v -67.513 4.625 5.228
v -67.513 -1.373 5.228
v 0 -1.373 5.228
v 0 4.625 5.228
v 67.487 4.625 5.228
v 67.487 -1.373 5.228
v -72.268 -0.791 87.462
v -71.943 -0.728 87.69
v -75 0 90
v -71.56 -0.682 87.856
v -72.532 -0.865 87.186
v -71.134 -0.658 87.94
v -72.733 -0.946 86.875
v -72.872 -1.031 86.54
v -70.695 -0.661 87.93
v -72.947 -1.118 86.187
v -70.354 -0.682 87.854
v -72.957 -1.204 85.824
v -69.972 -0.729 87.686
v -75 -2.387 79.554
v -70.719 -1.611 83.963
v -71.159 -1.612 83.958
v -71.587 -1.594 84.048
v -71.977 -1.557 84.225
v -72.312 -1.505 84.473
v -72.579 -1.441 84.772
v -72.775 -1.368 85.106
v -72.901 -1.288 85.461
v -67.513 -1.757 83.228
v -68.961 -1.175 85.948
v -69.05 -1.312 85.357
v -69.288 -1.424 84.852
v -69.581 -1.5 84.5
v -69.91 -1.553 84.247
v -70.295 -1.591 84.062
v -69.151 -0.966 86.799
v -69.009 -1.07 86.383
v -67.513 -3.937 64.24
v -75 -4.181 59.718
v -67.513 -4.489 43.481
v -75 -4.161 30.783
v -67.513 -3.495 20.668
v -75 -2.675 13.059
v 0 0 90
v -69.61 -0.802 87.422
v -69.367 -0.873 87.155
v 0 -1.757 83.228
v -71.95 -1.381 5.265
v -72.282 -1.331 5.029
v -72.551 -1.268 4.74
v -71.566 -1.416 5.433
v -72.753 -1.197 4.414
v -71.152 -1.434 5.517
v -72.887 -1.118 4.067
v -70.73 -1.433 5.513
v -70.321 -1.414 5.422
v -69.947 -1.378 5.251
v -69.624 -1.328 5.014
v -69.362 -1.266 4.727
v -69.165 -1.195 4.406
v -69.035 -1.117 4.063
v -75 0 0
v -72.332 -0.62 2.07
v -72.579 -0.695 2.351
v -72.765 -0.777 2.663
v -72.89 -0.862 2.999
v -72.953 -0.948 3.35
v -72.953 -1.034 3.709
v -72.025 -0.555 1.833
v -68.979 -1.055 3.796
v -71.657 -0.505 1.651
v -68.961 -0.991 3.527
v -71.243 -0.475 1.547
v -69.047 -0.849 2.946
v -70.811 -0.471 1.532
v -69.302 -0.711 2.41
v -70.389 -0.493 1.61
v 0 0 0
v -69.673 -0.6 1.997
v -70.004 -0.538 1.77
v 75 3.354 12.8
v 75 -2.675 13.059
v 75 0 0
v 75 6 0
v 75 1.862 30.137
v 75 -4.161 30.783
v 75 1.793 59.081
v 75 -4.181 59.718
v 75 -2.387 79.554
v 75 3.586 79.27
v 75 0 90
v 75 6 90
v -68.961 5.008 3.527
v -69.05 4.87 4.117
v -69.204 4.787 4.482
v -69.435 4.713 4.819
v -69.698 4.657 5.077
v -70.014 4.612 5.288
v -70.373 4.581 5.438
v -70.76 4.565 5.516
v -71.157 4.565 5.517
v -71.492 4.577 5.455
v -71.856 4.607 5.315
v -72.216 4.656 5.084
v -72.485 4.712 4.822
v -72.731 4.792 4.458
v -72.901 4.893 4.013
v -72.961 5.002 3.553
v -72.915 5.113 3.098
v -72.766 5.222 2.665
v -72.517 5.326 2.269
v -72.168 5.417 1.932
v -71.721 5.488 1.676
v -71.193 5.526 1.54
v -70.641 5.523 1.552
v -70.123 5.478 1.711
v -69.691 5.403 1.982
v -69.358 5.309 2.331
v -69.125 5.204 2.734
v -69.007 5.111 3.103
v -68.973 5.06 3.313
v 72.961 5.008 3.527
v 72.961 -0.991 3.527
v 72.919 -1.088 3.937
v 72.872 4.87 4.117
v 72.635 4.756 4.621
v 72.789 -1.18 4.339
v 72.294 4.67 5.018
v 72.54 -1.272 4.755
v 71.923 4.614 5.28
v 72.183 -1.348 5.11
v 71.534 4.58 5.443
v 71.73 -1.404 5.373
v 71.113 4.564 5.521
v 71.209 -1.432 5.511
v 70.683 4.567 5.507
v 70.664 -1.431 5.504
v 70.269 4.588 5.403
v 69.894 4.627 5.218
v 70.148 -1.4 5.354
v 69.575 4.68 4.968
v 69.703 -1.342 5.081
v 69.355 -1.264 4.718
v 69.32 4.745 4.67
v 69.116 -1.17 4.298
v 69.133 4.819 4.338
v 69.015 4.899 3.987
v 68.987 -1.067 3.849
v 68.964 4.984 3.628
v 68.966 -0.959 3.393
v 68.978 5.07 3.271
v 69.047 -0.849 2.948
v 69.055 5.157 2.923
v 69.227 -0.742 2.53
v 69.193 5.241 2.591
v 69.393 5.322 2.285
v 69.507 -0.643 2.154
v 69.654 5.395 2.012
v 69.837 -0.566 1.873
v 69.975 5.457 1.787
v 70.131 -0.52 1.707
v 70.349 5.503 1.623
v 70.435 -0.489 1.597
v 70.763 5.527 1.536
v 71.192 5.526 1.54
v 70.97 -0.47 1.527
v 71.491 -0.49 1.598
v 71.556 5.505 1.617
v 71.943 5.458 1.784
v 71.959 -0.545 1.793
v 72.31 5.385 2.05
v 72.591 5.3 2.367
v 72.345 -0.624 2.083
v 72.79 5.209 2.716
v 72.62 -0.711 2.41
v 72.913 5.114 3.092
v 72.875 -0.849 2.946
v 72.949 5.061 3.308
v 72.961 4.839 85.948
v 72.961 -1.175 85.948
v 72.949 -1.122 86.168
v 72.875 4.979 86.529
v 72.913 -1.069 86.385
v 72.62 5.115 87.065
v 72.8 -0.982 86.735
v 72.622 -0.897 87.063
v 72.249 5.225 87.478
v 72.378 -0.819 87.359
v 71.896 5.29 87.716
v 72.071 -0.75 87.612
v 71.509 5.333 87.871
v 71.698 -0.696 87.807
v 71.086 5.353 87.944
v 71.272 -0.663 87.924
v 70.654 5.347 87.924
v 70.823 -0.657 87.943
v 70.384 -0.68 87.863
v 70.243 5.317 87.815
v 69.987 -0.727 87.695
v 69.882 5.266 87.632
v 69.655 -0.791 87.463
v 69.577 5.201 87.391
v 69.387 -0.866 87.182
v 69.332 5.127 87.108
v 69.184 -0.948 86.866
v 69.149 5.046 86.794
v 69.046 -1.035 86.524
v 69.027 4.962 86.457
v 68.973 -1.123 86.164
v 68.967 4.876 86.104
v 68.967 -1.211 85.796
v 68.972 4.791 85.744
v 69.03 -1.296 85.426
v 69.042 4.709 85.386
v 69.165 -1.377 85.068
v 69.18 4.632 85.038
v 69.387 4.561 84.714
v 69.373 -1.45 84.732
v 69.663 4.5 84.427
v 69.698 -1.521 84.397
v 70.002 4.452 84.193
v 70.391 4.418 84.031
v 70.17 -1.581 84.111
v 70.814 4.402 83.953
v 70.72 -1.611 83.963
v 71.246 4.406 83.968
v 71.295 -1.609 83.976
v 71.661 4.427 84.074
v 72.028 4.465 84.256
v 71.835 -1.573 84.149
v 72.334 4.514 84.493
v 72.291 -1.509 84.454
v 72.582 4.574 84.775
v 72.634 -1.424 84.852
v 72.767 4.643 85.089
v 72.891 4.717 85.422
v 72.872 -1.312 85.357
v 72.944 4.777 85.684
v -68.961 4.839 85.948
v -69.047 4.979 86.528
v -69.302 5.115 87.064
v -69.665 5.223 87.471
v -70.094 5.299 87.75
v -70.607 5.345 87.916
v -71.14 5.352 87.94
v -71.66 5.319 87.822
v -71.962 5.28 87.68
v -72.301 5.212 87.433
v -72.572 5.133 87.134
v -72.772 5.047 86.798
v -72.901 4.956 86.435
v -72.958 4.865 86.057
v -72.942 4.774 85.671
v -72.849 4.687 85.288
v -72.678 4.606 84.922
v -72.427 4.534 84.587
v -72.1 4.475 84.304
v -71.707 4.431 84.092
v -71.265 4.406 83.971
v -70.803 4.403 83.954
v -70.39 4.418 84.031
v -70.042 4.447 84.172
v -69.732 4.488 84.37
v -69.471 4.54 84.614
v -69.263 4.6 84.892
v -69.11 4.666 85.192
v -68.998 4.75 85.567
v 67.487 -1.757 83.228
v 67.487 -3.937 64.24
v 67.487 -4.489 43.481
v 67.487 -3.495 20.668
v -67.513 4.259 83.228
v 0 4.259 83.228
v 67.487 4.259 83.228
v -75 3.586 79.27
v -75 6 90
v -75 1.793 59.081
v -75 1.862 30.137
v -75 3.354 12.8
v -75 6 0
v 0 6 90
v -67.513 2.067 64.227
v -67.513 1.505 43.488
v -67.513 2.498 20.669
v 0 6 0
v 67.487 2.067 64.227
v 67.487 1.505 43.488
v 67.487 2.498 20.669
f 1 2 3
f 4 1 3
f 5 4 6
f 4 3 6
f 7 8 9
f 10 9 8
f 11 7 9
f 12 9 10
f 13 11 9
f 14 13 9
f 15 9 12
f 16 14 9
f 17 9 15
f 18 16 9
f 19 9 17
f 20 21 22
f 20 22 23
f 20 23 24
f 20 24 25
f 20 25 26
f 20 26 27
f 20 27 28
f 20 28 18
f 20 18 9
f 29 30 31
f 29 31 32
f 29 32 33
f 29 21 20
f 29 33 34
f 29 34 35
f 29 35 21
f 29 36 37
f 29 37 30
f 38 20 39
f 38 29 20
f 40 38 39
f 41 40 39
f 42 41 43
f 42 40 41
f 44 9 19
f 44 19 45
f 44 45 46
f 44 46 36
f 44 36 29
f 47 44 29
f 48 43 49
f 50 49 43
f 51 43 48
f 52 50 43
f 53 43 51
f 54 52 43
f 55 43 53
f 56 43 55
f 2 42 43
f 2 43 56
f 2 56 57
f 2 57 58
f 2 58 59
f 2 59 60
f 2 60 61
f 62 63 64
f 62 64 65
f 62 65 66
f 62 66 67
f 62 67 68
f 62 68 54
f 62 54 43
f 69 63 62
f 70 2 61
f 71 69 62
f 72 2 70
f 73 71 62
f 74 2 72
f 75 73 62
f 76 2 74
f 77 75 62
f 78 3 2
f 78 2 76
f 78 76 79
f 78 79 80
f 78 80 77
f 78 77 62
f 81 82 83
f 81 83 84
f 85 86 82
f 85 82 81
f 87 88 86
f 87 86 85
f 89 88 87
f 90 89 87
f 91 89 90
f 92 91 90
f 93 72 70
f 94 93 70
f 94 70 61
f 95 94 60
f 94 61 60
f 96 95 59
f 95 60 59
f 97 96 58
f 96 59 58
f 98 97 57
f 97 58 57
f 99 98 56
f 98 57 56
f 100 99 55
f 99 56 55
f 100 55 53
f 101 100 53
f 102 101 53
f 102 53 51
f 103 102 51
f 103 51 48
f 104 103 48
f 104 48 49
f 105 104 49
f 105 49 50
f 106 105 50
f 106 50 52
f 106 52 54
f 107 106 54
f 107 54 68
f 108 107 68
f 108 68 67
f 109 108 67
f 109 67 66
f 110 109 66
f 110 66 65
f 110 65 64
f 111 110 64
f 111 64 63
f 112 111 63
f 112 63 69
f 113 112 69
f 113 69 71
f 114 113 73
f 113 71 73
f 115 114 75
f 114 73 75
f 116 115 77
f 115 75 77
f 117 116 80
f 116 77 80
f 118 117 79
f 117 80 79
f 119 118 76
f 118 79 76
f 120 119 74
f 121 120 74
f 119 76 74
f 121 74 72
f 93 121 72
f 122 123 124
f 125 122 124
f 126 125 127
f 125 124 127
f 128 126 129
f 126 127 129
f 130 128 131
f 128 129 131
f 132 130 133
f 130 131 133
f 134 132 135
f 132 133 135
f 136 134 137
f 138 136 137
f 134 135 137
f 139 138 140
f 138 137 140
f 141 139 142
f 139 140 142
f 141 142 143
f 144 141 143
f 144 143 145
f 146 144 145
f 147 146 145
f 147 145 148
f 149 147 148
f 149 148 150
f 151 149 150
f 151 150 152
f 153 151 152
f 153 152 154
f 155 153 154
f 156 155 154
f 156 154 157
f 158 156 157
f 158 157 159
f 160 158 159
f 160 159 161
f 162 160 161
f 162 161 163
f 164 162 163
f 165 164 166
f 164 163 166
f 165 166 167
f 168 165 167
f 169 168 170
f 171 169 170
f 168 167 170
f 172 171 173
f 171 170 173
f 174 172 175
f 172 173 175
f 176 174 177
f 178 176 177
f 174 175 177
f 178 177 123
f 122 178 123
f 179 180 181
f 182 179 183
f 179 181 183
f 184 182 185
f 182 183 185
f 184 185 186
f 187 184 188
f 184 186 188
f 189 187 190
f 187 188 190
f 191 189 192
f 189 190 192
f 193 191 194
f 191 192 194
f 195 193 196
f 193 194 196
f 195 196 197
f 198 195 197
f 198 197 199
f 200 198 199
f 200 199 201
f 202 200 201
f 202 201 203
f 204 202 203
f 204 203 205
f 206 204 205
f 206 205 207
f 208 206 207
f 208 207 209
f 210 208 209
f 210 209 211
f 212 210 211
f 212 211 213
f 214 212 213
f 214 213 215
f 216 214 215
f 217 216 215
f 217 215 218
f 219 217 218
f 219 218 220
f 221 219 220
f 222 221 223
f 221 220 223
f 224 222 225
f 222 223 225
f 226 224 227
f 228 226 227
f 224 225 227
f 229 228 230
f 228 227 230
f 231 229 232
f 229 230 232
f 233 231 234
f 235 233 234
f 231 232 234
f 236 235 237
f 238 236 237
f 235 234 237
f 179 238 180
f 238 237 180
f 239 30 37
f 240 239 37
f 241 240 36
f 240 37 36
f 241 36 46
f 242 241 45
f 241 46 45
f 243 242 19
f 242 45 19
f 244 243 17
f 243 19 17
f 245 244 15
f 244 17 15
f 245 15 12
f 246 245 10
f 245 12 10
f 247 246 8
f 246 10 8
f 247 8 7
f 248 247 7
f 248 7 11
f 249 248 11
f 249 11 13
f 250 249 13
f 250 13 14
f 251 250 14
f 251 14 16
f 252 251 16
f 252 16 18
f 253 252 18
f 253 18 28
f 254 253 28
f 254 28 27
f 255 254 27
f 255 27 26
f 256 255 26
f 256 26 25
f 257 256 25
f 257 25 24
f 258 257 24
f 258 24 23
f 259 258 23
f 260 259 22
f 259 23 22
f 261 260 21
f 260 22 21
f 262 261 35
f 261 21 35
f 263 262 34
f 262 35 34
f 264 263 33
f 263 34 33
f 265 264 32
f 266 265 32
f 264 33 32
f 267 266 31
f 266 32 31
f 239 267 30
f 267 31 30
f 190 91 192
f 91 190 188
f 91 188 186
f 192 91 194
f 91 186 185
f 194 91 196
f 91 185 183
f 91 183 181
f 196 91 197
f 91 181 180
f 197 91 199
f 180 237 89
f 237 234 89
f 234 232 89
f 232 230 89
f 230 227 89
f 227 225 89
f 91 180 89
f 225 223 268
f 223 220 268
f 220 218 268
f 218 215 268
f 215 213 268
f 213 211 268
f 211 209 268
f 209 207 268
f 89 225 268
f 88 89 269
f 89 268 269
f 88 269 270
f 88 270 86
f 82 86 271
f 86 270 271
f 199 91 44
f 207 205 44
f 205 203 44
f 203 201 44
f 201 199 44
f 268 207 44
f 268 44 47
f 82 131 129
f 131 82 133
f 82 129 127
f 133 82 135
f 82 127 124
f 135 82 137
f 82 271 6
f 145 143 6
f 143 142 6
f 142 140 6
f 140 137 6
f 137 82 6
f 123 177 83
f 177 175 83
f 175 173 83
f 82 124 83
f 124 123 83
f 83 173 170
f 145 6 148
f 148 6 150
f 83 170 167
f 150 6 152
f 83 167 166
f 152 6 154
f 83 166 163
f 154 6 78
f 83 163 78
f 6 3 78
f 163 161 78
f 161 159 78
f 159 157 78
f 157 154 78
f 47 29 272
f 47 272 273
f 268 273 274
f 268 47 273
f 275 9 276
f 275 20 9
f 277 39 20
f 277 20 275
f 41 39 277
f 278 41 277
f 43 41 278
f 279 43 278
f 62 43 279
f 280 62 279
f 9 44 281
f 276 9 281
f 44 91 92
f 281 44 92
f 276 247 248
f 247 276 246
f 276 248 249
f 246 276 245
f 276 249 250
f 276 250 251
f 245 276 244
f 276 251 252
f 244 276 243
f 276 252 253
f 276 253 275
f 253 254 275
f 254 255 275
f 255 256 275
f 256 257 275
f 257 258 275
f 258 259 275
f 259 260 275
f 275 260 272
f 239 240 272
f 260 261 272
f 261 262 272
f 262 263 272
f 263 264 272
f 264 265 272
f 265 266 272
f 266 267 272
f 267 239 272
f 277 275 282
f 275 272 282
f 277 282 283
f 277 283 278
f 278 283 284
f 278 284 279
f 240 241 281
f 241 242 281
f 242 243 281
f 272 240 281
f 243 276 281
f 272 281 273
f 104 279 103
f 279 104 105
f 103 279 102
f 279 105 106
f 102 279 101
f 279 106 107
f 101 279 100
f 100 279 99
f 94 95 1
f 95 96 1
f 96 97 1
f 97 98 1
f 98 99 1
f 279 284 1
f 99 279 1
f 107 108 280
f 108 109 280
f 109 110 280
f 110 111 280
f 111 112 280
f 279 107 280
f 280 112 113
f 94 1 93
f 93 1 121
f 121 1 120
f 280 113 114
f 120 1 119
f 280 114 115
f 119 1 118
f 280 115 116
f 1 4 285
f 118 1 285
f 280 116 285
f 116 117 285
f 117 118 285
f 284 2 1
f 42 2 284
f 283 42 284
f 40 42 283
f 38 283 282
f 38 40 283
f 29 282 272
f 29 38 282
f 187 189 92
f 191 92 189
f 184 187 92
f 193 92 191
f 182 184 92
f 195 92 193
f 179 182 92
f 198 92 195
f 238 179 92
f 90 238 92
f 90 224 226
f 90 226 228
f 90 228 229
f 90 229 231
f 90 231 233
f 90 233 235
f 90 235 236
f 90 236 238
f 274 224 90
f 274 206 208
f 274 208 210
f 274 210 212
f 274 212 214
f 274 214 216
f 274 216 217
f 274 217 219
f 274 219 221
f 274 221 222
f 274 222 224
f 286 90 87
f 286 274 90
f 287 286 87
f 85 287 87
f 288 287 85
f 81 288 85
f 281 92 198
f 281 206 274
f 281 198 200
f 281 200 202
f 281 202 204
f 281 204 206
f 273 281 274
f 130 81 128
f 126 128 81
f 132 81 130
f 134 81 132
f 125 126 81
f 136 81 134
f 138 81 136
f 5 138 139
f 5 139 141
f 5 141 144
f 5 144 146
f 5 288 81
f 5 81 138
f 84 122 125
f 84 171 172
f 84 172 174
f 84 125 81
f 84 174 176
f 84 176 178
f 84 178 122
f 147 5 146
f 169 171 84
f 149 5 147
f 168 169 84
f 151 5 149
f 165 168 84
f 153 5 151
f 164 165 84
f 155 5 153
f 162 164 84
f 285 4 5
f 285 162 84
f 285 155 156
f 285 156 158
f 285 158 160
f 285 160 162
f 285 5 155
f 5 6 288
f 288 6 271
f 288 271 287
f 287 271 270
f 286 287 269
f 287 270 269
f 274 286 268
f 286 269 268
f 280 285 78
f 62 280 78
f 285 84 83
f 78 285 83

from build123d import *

# Parameters (mm, degrees)
F1_DEPTH = 75
F2_DEPTH = 75
F4_W     = 135
F4_H     = 78
F5_DEPTH = 12
F6_R     = 2
F7_DEPTH = 25


with BuildPart() as f1:
    # F0 (on Right) → F1 (new body)
    with BuildSketch(Plane.YZ):
        with BuildLine():
            Line((6, 90), (0, 90))
            add(Edge.make_bspline(
                [(0, 90), (-5.988211, 73.405368), (-6, 18), (0, 0)],
                knots=[0, 0, 0, 0, 90, 90, 90, 90], degree=3))
            Line((0, 0), (6, 0))
            add(Edge.make_bspline(
                [(6, 90), (0, 73.029437), (0, 18), (6, 0)],
                knots=[0, 0, 0, 0, 90, 90, 90, 90], degree=3))
        make_face()
    extrude(amount=F1_DEPTH)

    # F1_face (on face) → F2 (join)
    with BuildSketch(Plane(origin=(0, -0.249906, 45.026938), x_dir=(0, 1, 0), z_dir=(-1, 0, 0))):
        with BuildLine():
            Line((0.249906, -44.973062), (6.249906, -44.973062))
            add(Edge.make_bspline(
                [(6.249906, -44.973062), (0.249906, -28.002499), (0.249906, 27.026938), (6.249906, 45.026938)],
                knots=[0, 0, 0, 0, 90, 90, 90, 90], degree=3))
            Line((6.249906, 45.026938), (0.249906, 45.026938))
            add(Edge.make_bspline(
                [(0.249906, -44.973062), (-5.738305, -28.37843), (-5.750094, 27.026938), (0.249906, 45.026938)],
                knots=[0, 0, 0, 0, 90, 90, 90, 90], degree=3))
        make_face()
    extrude(amount=F2_DEPTH)

    # F4 (on offset) → F5 (cut)
    with BuildSketch(Plane.XZ.offset(6)):
        with Locations((-0.013318, 44.228188)):
            Rectangle(F4_W, F4_H)
    extrude(amount=-F5_DEPTH, mode=Mode.SUBTRACT)

    # F6 (on offset) → F7 (cut)
    with BuildSketch(Plane.XZ.offset(6)):
        with Locations((-70.961185, 85.947864)):
            Circle(F6_R)
        with Locations((70.961185, 85.947864)):
            Circle(F6_R)
        with Locations((70.961185, 3.526589)):
            Circle(F6_R)
        with Locations((-70.961185, 3.526589)):
            Circle(F6_R)
    extrude(amount=-F7_DEPTH, mode=Mode.SUBTRACT)


solid = f1.part
